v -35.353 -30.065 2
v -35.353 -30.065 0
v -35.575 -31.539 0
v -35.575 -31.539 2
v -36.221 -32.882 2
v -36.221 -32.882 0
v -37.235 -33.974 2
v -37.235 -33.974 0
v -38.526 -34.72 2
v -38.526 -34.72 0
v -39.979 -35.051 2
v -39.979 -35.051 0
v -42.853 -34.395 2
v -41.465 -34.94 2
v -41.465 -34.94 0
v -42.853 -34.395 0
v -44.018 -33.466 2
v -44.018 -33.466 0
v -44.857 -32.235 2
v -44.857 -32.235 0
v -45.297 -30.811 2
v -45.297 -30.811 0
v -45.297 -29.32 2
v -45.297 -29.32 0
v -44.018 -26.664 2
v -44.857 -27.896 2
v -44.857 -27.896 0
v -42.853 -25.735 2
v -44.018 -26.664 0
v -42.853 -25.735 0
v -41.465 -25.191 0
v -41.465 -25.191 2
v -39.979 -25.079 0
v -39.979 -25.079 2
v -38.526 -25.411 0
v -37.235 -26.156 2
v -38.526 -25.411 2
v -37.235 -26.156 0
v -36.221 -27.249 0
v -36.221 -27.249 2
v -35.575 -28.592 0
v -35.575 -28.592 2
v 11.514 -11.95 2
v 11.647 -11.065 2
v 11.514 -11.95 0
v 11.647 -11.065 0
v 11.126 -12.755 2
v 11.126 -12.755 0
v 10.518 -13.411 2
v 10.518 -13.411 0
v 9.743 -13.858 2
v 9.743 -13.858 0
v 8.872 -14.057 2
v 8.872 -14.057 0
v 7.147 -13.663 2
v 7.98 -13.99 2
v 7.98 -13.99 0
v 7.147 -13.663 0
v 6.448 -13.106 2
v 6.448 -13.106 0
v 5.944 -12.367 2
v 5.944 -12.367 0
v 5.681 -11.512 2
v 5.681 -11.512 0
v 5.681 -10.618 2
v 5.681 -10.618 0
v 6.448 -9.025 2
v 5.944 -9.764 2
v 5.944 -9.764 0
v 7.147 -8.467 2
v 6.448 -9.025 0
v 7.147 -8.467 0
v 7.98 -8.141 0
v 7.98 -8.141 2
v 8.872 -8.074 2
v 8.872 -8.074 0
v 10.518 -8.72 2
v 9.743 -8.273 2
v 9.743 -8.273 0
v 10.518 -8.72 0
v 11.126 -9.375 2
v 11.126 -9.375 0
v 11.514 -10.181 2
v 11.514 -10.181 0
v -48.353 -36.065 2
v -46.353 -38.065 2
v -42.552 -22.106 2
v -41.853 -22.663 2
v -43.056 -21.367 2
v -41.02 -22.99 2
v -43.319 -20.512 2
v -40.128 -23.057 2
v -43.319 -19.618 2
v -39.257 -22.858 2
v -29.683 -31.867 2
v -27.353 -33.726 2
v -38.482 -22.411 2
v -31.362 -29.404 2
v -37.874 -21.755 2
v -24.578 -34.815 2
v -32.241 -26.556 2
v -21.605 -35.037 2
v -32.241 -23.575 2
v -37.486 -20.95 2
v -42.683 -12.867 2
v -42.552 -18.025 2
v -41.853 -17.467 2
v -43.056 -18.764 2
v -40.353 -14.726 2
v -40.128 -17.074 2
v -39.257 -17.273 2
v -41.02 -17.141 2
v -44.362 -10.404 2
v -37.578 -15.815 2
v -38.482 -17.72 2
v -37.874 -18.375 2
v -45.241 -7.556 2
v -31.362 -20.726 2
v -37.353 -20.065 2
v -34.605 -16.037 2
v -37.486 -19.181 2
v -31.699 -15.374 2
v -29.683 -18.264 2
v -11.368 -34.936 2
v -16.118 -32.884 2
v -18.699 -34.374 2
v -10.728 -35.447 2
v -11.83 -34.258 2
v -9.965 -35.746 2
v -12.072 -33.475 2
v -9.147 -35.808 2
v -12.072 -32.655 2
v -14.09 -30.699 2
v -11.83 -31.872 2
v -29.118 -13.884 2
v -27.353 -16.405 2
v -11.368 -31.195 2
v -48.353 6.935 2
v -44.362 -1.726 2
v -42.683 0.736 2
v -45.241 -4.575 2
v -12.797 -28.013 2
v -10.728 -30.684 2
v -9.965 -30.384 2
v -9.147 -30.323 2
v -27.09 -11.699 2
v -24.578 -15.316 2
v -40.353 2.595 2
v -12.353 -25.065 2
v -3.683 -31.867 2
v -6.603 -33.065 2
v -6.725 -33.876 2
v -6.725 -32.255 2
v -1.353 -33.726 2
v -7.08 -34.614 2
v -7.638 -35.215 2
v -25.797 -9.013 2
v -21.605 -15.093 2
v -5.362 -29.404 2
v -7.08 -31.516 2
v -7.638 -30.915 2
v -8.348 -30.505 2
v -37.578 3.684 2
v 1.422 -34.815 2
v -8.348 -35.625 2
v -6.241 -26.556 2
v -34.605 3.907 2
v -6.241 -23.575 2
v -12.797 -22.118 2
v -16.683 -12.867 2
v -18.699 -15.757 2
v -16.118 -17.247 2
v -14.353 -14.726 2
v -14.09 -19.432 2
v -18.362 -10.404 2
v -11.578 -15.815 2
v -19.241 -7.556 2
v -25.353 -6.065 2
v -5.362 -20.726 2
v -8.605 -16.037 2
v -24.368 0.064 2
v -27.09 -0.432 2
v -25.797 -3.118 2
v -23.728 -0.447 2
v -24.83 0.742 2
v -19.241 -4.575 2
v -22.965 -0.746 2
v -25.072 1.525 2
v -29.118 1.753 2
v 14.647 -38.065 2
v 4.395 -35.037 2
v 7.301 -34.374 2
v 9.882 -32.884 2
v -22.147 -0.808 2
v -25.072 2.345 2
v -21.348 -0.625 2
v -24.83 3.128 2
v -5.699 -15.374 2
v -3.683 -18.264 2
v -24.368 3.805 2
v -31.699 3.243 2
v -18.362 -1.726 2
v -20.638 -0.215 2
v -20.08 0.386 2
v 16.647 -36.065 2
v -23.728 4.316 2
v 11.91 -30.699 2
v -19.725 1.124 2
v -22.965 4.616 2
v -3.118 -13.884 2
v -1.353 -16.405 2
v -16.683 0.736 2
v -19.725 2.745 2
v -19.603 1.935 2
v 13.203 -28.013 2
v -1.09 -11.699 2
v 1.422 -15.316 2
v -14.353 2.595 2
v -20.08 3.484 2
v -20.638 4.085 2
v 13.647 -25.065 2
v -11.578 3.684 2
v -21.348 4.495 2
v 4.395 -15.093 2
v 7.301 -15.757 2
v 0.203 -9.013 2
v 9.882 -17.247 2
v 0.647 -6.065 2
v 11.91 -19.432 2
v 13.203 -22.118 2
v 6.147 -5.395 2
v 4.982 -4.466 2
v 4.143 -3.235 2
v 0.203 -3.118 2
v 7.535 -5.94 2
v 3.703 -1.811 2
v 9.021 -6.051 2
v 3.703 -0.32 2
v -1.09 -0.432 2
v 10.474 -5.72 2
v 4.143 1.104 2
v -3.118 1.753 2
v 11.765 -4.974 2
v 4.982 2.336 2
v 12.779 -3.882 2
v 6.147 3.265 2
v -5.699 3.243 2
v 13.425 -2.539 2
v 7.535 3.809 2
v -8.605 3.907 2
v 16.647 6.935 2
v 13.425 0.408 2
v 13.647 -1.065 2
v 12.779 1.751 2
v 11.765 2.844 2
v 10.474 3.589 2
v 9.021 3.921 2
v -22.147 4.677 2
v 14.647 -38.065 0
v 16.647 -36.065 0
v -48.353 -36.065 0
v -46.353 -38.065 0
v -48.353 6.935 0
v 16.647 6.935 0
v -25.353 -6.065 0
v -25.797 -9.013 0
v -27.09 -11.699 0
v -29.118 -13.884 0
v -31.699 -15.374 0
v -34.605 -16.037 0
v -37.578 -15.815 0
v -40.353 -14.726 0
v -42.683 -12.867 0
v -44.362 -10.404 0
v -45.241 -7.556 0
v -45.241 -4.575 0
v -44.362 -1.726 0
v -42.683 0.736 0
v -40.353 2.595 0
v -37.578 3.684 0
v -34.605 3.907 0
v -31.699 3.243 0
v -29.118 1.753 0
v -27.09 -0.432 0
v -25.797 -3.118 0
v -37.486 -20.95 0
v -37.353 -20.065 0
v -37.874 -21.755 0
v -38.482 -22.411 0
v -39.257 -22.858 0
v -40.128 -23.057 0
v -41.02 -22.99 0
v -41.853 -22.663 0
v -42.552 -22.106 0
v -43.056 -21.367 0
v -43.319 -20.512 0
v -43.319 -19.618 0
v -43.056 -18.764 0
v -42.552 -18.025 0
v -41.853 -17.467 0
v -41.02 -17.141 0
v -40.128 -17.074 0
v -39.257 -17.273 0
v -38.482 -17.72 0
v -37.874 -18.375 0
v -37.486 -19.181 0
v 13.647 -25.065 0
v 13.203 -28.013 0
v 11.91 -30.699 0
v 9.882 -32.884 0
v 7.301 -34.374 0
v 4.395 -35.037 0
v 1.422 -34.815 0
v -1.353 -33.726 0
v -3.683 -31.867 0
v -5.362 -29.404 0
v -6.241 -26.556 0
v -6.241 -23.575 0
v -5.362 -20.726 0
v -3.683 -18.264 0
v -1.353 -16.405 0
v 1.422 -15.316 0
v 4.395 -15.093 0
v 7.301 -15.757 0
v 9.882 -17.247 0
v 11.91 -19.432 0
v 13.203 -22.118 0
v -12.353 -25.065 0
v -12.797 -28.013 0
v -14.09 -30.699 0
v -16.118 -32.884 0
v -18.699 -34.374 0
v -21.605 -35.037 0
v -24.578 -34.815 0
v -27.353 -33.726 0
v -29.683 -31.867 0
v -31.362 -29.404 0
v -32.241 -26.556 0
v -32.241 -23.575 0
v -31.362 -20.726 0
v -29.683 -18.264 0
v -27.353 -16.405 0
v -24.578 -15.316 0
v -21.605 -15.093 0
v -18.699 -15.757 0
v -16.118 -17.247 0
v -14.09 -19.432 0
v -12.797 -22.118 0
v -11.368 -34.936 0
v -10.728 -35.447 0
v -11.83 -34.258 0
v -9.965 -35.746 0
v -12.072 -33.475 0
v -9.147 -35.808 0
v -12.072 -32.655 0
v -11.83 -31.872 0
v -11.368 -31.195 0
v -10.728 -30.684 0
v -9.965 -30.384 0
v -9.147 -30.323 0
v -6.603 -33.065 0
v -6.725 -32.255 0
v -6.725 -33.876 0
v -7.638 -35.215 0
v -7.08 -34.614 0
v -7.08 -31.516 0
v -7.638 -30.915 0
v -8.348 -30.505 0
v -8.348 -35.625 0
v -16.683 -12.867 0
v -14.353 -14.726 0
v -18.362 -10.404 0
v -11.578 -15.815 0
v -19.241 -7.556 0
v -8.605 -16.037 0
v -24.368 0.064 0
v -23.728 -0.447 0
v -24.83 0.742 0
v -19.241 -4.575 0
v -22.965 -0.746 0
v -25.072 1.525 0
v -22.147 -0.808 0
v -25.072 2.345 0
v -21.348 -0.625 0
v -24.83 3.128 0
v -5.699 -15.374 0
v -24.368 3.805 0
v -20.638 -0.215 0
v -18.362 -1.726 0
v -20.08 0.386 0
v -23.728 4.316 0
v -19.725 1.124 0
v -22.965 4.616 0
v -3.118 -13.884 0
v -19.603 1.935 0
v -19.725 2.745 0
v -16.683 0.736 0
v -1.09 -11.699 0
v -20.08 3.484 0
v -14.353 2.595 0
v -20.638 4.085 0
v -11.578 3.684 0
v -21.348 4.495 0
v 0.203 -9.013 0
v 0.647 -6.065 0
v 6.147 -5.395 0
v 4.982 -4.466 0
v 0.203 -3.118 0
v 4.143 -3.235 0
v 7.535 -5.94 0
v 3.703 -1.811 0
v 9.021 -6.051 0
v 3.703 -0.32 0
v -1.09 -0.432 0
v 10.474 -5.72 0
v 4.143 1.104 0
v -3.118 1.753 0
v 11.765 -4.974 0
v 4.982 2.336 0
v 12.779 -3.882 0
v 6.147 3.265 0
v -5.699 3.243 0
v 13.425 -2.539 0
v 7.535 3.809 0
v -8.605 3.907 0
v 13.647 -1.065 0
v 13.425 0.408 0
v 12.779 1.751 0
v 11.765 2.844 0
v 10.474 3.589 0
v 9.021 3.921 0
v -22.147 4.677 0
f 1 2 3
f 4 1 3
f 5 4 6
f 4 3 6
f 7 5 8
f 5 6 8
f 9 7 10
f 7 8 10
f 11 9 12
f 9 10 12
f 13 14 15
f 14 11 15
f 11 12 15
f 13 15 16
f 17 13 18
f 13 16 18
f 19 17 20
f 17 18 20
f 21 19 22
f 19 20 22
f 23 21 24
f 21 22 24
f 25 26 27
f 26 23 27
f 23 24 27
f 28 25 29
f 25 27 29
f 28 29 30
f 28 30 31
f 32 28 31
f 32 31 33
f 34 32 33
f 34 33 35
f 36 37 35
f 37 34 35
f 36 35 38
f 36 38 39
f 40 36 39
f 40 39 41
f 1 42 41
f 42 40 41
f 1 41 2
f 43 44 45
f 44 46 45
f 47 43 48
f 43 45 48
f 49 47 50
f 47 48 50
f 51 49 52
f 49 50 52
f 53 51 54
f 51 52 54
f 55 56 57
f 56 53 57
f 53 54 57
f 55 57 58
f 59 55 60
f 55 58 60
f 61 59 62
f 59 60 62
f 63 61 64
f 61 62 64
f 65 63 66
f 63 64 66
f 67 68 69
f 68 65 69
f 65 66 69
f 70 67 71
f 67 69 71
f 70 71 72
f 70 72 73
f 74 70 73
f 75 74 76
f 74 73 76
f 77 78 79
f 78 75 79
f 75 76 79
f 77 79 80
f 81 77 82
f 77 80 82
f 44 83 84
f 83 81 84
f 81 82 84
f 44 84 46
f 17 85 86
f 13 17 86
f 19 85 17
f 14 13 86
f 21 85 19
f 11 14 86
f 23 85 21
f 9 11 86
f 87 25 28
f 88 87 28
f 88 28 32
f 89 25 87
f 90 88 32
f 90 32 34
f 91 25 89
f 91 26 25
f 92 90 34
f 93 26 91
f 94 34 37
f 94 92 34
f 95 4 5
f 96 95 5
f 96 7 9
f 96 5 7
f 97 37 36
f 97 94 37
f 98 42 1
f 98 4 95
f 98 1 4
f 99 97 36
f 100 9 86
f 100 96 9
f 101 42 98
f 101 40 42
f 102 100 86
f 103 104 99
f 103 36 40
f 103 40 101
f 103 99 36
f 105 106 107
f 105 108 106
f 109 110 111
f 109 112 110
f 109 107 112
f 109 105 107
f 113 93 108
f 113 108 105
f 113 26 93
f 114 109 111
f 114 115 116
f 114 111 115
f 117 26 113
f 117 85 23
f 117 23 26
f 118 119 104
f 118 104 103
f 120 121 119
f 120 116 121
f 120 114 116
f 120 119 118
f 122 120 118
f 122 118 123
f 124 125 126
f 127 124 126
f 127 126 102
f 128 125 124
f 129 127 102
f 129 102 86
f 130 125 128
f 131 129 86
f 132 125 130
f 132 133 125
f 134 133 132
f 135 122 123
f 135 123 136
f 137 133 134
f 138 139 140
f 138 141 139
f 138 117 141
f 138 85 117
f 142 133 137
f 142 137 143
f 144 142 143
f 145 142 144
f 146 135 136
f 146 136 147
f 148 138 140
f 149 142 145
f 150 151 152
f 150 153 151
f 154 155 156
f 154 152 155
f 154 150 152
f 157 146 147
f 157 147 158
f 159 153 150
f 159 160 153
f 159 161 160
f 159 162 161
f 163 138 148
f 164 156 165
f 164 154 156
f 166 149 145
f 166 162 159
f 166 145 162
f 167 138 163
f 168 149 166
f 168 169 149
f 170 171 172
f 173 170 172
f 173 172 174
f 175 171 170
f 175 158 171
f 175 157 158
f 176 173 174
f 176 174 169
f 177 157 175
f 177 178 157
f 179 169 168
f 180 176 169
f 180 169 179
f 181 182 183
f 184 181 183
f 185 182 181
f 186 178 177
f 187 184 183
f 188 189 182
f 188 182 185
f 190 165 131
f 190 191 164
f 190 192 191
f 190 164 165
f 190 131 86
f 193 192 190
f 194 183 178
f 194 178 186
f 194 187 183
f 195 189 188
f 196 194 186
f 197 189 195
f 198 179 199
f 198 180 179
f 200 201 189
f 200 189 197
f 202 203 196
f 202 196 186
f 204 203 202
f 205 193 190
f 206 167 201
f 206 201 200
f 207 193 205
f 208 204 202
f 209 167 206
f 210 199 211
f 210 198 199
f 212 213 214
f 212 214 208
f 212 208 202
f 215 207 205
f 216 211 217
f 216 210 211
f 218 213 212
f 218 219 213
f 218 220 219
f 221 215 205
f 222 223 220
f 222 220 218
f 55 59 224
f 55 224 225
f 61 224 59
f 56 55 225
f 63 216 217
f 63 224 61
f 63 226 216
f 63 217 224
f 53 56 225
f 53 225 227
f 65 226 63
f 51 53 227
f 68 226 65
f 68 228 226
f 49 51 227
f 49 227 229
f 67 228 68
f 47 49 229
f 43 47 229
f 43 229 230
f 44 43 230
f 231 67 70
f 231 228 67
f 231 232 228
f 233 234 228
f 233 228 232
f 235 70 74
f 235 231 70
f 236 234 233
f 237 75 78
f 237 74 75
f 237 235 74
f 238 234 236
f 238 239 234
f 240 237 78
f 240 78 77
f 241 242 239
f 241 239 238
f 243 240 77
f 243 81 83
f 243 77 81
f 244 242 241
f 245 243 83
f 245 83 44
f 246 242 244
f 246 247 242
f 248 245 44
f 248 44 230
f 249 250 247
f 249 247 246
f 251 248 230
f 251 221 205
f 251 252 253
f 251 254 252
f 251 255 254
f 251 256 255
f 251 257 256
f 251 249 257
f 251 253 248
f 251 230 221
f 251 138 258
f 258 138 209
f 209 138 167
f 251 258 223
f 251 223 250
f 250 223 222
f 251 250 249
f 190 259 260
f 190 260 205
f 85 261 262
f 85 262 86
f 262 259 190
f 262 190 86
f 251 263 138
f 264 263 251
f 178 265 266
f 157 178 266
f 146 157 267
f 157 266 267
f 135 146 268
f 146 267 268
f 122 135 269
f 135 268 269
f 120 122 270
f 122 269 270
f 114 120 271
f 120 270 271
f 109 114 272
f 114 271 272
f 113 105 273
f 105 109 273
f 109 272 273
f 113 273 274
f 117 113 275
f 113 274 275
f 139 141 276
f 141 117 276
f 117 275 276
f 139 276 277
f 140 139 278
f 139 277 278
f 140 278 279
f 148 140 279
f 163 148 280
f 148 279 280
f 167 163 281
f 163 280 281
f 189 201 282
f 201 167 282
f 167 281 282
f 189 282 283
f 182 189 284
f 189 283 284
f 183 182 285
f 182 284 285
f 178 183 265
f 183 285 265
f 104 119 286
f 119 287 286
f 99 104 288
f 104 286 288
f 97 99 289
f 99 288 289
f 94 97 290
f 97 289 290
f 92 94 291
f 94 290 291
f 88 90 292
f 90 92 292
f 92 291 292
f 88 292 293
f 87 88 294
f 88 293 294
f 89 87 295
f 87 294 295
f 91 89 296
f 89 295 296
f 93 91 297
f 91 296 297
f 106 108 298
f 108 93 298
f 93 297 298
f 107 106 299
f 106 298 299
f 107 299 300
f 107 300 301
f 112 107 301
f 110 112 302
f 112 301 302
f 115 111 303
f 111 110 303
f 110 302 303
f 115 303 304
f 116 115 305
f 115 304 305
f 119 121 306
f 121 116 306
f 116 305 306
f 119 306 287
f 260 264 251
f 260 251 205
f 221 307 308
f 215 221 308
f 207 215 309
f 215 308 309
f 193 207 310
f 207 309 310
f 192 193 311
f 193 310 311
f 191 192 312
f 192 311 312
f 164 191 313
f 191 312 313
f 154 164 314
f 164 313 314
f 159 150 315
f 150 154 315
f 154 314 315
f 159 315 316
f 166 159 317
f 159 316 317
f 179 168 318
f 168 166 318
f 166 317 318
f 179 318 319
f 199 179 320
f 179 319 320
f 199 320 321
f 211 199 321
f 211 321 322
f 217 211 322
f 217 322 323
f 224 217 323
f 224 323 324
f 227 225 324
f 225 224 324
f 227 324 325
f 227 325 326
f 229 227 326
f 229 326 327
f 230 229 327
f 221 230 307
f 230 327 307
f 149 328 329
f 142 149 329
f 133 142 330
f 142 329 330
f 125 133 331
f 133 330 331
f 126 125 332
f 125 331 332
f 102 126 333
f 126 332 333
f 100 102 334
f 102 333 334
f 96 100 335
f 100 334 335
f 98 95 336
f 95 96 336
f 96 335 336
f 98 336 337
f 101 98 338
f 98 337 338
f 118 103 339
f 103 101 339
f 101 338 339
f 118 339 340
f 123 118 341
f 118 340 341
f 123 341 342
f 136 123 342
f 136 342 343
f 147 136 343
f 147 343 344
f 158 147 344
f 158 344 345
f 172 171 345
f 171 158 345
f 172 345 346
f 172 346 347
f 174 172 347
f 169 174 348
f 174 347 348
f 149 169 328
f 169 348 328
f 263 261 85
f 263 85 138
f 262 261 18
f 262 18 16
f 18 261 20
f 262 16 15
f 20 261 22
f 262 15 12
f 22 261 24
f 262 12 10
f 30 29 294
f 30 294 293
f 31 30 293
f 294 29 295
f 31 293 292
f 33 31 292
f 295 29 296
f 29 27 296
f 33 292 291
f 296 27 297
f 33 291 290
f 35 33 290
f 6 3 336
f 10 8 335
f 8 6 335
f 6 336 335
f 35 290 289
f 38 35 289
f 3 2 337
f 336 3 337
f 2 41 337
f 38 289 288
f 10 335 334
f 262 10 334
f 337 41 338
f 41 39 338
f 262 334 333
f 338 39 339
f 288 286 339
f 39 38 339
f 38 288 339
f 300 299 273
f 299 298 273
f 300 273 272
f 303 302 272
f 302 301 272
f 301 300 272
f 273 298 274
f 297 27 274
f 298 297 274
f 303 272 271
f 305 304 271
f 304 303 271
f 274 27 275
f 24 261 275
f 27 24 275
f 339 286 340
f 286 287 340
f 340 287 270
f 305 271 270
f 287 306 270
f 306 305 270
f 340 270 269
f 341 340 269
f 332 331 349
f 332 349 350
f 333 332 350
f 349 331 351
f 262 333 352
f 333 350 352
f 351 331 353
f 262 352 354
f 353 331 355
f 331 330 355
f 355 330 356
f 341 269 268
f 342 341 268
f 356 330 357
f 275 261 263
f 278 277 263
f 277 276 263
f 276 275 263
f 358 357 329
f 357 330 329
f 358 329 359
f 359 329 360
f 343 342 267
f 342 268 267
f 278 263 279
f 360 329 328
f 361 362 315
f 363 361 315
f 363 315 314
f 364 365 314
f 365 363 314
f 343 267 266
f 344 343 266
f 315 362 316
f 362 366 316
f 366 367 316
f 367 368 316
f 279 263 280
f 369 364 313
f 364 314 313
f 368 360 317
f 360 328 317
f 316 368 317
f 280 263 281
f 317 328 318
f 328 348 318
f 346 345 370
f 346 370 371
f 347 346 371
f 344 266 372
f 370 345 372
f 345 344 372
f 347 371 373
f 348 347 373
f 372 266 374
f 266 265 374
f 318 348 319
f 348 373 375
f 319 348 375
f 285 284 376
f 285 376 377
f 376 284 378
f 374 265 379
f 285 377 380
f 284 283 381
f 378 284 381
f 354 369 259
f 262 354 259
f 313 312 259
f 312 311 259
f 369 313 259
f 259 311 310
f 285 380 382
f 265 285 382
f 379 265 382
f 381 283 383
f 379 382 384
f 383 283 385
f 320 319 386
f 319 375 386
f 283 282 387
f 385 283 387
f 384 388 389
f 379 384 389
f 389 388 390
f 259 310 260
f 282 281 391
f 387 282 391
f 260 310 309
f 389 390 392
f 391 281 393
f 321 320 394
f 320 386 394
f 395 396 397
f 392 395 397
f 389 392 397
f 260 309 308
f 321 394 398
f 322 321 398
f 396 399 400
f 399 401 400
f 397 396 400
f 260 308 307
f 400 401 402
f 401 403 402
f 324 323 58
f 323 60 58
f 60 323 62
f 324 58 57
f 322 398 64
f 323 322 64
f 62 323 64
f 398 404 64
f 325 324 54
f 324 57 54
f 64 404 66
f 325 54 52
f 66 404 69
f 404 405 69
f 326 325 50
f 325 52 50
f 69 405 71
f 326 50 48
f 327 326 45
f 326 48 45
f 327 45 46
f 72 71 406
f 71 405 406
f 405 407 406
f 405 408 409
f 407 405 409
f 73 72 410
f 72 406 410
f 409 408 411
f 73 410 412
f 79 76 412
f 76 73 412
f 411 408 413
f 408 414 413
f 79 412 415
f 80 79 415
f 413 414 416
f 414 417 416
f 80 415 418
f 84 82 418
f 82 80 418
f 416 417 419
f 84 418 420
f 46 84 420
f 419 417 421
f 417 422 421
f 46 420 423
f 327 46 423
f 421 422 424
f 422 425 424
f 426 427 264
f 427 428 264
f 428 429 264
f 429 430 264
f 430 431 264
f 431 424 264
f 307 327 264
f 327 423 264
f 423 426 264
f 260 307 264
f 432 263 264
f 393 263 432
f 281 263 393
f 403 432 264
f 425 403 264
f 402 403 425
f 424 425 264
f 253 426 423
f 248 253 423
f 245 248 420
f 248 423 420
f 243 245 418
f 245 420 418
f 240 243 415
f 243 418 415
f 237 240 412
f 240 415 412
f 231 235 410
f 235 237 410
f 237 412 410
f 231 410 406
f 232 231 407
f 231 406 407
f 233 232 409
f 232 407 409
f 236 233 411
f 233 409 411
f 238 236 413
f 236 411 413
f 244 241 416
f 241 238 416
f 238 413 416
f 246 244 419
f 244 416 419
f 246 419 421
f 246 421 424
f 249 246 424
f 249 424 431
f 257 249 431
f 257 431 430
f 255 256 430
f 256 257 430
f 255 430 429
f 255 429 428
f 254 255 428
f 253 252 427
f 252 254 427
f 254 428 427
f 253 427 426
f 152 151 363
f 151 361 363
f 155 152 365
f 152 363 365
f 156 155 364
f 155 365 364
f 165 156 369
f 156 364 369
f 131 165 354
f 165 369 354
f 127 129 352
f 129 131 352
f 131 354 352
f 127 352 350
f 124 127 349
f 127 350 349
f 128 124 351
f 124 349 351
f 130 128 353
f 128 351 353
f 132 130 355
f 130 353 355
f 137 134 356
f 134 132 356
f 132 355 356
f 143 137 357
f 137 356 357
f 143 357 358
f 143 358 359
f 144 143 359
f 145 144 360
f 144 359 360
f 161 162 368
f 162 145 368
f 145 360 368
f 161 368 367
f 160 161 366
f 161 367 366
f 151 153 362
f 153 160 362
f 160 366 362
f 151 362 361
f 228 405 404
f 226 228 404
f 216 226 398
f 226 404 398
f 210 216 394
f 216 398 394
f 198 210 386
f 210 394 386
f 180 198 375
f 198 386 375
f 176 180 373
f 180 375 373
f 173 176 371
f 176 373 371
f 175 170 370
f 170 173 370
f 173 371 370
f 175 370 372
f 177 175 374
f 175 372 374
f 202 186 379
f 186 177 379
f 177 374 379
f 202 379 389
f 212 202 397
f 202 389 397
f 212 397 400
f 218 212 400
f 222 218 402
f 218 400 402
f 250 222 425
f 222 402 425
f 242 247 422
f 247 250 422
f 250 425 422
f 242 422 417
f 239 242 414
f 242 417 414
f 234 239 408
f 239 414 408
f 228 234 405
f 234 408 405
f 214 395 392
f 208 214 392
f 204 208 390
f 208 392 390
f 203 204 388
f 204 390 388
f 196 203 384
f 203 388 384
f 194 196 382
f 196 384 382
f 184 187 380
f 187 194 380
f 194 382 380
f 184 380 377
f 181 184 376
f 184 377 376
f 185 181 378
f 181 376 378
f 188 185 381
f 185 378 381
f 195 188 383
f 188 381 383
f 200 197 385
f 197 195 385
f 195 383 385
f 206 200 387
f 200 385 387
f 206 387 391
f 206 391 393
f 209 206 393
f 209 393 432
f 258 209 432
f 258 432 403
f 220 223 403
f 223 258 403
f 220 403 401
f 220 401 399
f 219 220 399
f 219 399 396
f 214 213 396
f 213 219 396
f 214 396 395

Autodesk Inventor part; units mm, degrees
ref_plane "YZ Plane" through (0, 0, 0) normal (1, 0, 0) x (0, 1, 0)
ref_plane "XZ Plane" through (0, 0, 0) normal (0, 1, 0) x (-1, 0, 0)
ref_plane "XY Plane" through (0, 0, 0) normal (0, 0, 1) x (1, 0, 0)
sketch "Sketch1" plane through (0, 0, 0) normal (0, 0, 1) x (1, 0, 0)
  line L0 (-48.3526, 6.9347) -> (16.6474, 6.9347)
  line L1 (16.6474, 6.9347) -> (16.6474, -38.0653)
  line L2 (16.6474, -38.0653) -> (-48.3526, -38.0653)
  line L3 (-48.3526, -38.0653) -> (-48.3526, 6.9347)
  circle A0 centre (-35.3526, -6.0653) radius 10
  circle A1 centre (-22.3526, -25.0653) radius 10
  circle A2 centre (-9.3526, -6.0653) radius 10
  circle A3 centre (3.6474, -25.0653) radius 10
  circle A4 centre (-40.3526, -30.0653) radius 5
  circle A5 centre (8.6474, -1.0653) radius 5
  circle A6 centre (-40.3526, -20.0653) radius 3
  circle A7 centre (8.6474, -11.0653) radius 3
  circle A8 centre (-9.3526, -33.0653) radius 2.75
  circle A9 centre (-22.3526, 1.9347) radius 2.75
  dimension "d1" = 65
  dimension "d2" = 45
  dimension "d3" = 20
  dimension "d10" = 13
  dimension "d11" = 13
  dimension "d40" = 20
  dimension "d41" = 20
  dimension "d42" = 20
  dimension "d43" = 13
  dimension "d44" = 13
  dimension "d45" = 39
  dimension "d46" = 39
  dimension "d47" = 10
  dimension "d48" = 10
  dimension "d49" = 8
  dimension "d50" = 8
  dimension "d51" = 8
  dimension "d52" = 8
  dimension "d53" = 6
  dimension "d54" = 6
  dimension "d55" = 18
  dimension "d56" = 18
  dimension "d57" = 5.5
  dimension "d58" = 5.5
  dimension "d59" = 5
  dimension "d60" = 5
extrude "Extrusion1" add sketch "Sketch1" along normal blind 2
chamfer "Chamfer2" distance 2 angle 45 2 edges at (-48.3526, -38.0653, 1) (16.6474, -38.0653, 1)
equation "\"d10\" = d11"
equation "\"d40\" = d3"
equation "\"d41\" = d3"
equation "\"d42\" = d3"
equation "\"d43\" = d11"
equation "\"d44\" = d11"
properties part number "CNCM_ALU_First_sieve" material "Aluminum 6061"
